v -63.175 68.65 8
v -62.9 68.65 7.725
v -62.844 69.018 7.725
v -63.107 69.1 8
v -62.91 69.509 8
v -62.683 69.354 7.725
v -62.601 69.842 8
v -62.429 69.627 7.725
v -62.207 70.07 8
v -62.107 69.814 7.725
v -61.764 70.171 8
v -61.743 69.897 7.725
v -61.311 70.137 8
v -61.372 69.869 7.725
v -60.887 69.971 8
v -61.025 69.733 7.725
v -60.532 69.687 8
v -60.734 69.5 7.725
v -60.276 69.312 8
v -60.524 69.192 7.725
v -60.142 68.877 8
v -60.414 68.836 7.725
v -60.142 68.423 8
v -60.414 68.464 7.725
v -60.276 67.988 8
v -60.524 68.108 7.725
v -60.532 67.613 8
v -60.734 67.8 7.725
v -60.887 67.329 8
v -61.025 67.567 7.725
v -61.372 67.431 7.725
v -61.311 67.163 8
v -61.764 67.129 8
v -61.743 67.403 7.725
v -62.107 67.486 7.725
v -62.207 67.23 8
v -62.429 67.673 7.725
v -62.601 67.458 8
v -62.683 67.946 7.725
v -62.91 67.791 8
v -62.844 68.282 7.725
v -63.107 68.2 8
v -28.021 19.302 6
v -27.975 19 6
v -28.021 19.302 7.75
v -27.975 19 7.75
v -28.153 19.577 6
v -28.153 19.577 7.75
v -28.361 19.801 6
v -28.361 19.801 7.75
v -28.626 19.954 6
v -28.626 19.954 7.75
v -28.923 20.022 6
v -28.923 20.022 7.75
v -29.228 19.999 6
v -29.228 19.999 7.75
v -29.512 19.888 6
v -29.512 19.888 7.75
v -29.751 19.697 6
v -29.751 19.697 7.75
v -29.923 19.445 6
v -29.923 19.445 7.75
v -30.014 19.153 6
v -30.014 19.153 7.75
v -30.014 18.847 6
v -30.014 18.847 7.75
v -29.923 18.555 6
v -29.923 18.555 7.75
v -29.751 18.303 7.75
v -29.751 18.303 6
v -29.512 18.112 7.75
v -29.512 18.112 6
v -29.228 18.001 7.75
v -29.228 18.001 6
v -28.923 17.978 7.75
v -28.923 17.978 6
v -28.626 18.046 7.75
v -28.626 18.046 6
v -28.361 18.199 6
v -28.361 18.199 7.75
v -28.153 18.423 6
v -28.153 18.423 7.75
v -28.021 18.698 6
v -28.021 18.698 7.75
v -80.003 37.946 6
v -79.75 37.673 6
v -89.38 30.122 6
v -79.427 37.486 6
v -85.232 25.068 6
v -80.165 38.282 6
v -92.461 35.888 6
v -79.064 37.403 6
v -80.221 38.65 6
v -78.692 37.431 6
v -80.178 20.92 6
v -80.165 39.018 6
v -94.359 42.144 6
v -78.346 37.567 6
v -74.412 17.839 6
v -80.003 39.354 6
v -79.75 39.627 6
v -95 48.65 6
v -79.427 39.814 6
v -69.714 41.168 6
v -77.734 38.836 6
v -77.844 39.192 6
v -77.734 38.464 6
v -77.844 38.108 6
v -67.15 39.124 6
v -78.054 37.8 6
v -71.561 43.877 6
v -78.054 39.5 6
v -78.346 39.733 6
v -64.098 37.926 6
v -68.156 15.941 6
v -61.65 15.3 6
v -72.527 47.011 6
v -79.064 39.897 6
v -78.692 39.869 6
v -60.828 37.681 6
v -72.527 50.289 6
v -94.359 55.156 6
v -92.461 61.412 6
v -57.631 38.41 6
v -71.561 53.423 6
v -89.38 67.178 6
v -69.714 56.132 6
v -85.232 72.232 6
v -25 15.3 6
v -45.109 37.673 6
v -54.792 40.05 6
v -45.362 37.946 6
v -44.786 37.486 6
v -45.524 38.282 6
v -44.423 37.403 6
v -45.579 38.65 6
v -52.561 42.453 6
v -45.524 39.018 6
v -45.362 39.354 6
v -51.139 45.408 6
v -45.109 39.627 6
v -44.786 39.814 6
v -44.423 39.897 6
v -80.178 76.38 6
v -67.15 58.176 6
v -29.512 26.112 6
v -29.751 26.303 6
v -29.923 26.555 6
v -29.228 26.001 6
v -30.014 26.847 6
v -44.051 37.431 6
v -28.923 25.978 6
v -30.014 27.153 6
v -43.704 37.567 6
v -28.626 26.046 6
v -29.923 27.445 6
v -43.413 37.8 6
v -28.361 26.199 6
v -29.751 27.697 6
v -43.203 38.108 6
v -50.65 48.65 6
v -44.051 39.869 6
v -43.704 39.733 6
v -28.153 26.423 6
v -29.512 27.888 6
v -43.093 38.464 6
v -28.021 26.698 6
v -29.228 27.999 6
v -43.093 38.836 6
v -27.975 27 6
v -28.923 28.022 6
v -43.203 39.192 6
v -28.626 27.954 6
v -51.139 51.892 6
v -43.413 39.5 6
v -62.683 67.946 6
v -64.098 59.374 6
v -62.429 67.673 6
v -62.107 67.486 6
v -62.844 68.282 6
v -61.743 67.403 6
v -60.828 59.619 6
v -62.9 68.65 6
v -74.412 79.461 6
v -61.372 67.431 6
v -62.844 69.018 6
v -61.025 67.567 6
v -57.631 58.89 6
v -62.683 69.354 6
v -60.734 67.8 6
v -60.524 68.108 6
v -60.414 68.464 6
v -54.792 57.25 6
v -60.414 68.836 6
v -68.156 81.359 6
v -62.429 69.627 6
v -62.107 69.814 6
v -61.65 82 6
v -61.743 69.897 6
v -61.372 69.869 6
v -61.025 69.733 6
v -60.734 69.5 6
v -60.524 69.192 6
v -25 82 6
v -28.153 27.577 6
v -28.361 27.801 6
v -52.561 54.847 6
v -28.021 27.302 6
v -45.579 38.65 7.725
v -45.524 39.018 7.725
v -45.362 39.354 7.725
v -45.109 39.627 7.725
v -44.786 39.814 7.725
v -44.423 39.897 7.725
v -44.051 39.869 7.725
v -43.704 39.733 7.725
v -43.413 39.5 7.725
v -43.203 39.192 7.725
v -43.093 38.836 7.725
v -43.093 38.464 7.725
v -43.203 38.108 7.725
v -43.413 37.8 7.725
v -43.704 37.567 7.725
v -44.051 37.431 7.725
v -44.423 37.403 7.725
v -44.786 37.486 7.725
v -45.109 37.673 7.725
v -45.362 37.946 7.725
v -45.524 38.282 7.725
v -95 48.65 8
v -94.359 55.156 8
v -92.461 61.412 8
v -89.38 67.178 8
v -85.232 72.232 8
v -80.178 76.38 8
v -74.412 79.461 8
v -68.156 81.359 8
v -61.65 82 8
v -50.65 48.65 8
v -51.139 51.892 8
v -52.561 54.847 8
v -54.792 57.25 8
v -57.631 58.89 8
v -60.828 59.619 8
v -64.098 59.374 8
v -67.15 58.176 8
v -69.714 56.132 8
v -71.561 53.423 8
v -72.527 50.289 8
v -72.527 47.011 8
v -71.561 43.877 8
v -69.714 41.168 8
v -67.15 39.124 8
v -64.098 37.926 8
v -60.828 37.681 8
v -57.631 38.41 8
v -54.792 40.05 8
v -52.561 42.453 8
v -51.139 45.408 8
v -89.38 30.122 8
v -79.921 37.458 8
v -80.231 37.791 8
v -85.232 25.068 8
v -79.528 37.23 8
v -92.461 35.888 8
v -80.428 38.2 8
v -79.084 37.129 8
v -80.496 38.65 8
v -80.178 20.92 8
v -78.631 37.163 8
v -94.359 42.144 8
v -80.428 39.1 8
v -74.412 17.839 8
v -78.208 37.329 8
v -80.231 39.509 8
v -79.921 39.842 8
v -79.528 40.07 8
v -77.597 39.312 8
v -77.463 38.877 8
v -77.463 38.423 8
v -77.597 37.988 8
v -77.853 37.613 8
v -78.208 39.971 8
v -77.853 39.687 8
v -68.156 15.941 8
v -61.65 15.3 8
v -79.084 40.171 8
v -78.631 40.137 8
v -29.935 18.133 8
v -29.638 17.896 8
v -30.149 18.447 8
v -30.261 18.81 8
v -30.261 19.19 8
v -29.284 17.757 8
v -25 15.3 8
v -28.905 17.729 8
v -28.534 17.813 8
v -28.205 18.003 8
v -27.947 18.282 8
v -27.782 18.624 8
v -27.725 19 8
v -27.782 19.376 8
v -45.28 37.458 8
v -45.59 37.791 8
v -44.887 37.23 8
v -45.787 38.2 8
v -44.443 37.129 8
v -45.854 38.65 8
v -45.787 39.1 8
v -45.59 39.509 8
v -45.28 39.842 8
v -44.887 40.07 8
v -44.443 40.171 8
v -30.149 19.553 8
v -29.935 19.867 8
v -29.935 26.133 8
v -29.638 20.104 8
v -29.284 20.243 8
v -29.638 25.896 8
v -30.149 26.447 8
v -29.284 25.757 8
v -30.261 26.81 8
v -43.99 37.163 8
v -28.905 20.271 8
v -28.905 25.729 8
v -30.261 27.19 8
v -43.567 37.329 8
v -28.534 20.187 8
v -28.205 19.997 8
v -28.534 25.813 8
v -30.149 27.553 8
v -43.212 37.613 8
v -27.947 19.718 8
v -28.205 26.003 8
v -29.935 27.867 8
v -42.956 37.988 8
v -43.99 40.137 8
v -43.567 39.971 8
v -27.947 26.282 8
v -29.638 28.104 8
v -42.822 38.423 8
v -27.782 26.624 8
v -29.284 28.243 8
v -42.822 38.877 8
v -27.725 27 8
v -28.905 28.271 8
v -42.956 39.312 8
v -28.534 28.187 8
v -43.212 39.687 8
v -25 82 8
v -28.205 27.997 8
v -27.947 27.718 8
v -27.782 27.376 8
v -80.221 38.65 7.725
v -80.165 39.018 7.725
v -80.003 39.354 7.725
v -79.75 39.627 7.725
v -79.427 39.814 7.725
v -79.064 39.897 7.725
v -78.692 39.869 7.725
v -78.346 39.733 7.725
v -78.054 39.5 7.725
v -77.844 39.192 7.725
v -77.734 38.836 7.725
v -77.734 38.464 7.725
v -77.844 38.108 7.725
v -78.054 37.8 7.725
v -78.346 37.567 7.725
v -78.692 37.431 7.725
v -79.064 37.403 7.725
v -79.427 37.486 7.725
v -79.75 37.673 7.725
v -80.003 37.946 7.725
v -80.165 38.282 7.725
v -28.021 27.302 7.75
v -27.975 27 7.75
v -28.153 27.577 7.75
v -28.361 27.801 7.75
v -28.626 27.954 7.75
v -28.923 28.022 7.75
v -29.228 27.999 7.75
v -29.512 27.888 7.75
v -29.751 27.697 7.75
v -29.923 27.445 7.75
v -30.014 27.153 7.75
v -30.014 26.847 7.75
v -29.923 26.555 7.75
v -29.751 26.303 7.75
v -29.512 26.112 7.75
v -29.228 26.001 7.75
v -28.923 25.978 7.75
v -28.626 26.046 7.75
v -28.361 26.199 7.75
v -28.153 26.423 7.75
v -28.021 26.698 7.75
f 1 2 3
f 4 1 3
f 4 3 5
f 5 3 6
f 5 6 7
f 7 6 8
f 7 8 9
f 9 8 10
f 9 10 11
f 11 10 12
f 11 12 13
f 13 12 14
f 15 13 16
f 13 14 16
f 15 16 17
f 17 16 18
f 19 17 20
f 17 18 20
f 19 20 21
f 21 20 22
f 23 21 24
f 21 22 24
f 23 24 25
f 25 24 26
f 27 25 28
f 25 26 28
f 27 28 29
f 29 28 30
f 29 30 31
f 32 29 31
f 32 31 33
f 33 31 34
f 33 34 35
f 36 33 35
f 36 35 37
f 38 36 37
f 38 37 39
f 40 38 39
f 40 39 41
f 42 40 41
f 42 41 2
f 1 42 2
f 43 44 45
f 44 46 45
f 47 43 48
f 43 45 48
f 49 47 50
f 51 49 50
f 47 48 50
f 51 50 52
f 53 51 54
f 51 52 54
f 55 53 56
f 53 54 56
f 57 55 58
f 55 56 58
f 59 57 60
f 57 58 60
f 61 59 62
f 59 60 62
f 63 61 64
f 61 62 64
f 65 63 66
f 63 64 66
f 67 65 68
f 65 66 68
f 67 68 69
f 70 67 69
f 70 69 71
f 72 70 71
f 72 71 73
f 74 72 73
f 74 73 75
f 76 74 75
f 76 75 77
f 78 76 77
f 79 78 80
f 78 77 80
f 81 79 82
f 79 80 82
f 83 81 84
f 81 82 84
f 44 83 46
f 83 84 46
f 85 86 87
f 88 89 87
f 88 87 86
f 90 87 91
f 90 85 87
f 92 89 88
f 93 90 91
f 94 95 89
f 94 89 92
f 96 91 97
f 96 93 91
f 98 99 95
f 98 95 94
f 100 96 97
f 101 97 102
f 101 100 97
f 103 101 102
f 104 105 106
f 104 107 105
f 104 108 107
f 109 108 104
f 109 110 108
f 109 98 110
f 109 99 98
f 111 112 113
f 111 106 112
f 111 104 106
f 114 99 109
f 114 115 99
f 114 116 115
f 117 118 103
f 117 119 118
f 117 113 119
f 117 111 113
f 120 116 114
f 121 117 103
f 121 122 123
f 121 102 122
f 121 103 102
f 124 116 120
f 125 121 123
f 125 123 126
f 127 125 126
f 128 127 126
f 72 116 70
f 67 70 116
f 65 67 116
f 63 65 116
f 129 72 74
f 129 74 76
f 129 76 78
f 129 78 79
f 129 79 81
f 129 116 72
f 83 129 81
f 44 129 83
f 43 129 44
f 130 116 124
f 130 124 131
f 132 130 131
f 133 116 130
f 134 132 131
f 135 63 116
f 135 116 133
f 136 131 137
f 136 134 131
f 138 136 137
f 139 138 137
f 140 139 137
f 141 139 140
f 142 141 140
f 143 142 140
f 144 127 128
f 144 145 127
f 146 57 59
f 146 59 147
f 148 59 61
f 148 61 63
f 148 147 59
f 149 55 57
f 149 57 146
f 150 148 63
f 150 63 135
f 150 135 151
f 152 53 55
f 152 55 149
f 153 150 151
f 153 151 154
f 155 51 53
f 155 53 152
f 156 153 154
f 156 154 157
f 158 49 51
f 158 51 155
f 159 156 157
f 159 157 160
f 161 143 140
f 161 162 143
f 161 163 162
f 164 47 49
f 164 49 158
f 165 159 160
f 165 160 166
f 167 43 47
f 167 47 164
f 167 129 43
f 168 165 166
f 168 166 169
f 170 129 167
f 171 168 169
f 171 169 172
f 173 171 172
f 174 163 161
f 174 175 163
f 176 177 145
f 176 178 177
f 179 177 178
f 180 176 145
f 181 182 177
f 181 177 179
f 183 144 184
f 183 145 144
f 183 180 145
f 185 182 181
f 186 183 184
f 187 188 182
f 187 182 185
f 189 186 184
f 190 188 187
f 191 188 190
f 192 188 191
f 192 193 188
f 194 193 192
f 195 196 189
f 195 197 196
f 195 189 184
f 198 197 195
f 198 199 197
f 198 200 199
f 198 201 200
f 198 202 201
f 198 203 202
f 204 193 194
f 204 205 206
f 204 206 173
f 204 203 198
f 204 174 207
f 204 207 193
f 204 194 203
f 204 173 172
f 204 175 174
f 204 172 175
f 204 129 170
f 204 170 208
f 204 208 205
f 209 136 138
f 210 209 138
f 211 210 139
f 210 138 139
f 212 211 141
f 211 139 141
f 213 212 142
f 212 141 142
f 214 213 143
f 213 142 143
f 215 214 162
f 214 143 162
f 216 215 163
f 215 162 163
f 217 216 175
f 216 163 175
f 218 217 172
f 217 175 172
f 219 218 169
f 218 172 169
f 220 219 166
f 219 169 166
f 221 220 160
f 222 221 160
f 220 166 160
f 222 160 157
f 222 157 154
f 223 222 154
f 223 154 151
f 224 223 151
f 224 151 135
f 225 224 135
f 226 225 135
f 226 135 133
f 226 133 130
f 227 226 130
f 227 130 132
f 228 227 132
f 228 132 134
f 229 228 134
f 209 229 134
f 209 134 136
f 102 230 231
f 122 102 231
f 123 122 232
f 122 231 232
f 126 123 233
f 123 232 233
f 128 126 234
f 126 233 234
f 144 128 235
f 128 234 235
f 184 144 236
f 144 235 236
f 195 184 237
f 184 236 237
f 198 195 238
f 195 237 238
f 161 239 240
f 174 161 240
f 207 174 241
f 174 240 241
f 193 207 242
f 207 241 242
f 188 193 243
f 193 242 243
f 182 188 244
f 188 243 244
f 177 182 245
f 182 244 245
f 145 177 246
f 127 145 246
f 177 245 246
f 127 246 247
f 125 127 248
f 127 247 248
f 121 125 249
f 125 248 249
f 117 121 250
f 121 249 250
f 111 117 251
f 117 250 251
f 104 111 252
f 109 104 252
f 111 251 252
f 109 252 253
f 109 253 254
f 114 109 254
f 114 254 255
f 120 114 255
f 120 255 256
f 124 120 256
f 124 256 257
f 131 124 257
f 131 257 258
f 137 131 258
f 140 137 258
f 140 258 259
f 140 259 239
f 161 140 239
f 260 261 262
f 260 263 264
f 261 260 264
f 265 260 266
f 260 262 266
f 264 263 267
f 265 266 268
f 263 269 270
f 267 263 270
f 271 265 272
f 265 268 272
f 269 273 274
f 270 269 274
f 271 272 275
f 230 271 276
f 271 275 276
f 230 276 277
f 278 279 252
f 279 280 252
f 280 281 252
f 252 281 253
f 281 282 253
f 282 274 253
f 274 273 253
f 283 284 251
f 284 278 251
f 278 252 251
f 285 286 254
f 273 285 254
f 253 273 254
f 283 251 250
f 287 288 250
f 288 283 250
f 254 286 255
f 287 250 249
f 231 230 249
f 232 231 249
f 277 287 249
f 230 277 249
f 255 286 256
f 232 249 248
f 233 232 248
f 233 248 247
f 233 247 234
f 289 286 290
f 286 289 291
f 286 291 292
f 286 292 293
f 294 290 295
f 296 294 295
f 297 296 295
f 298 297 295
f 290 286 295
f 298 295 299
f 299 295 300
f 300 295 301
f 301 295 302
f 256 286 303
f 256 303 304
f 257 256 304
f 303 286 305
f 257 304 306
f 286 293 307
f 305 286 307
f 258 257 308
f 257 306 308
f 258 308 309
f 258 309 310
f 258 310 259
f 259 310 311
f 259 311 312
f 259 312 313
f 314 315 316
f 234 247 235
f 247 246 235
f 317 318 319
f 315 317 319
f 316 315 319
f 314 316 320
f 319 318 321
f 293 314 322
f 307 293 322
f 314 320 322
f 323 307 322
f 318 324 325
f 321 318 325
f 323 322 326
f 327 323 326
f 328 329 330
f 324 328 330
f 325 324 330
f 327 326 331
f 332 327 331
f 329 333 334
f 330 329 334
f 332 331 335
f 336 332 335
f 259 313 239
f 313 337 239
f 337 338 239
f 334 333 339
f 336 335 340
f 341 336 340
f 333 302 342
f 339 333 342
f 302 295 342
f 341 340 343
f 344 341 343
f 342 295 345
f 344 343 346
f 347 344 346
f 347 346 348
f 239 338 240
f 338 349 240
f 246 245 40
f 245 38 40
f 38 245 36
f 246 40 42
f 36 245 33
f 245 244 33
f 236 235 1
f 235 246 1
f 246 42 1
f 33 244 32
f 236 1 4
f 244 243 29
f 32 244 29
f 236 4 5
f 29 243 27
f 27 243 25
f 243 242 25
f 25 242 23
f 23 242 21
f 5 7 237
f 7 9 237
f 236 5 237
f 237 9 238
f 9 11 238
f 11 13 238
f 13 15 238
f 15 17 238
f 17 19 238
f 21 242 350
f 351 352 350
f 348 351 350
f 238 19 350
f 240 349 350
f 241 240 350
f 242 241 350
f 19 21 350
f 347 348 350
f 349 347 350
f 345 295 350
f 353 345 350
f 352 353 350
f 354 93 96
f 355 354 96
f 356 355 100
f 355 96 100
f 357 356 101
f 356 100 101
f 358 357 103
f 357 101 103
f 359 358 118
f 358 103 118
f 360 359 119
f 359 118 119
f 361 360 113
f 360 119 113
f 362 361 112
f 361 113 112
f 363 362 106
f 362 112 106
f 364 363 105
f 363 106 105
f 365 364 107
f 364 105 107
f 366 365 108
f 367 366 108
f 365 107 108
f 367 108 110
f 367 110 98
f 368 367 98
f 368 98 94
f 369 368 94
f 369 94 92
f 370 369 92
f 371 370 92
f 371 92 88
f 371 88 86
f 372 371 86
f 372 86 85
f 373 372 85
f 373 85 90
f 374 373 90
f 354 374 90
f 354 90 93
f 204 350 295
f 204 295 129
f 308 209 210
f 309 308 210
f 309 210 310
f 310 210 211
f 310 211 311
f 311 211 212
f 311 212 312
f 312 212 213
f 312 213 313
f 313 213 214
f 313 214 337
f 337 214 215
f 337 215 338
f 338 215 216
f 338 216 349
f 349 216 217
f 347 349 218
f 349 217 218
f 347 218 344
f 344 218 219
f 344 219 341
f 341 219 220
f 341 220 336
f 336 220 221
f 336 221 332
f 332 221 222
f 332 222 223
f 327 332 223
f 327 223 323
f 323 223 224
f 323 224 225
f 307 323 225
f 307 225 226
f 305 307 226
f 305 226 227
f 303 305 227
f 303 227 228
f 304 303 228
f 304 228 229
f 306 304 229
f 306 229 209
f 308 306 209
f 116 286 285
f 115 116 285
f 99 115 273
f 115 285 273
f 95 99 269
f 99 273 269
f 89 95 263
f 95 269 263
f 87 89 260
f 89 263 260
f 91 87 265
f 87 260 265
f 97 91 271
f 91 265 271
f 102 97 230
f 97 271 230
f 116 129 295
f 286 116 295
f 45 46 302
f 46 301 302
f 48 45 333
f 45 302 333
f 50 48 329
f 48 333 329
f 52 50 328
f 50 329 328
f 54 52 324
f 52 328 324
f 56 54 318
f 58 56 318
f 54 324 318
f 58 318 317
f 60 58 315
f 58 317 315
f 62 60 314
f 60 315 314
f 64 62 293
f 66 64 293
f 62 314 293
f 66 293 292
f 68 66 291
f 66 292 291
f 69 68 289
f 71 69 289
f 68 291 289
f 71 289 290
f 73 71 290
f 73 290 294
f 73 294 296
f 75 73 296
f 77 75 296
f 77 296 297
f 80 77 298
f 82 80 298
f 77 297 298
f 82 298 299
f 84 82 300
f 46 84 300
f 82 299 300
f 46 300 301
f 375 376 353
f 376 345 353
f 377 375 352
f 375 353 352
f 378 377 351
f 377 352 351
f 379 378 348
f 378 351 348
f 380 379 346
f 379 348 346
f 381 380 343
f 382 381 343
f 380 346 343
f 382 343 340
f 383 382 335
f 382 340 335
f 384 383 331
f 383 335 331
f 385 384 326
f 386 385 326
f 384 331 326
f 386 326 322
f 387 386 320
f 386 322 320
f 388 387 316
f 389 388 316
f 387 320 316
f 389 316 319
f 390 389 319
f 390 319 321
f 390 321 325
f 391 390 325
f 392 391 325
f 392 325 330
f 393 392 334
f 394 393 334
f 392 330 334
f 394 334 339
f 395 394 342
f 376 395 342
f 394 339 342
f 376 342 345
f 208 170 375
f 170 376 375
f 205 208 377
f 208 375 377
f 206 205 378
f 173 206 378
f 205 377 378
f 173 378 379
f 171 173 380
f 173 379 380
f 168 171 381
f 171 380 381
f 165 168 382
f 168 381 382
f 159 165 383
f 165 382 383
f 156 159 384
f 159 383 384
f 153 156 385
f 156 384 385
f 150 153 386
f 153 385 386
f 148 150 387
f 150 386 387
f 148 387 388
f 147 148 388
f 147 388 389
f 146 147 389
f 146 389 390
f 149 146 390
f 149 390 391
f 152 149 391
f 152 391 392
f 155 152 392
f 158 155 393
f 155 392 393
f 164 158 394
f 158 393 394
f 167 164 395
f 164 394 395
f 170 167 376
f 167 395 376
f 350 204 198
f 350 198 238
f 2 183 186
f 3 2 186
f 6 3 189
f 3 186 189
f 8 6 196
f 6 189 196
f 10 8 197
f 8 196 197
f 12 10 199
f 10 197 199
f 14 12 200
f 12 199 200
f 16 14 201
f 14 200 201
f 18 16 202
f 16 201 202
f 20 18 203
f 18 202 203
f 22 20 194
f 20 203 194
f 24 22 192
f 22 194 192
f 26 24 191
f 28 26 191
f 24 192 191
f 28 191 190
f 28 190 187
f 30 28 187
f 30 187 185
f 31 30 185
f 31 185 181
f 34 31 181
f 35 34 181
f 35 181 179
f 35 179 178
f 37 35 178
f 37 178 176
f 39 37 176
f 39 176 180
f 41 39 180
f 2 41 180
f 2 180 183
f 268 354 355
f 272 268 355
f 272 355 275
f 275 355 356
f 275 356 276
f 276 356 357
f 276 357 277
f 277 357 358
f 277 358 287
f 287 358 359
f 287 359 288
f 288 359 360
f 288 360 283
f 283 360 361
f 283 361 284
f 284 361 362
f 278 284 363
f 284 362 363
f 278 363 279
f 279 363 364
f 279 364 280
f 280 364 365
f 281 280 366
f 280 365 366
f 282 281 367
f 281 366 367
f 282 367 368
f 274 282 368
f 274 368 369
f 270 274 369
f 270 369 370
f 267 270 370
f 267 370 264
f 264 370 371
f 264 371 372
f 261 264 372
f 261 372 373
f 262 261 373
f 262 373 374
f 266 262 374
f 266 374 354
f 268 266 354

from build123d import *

# Parameters (mm, degrees)
SKETCH_1_W                   = 50
SKETCH_1_H                   = 100
EXTRUDE_1_DEPTH              = 2
SKETCH_2_W                   = 3
SKETCH_2_H                   = 100
EXTRUDE_2_DEPTH              = 80
SKETCH_3_W                   = 2
SKETCH_3_H                   = 66.7
EXTRUDE_3_DEPTH              = 70
CUT_EXTRUDE_4_REACH          = 162.465
SKETCH_8_W                   = 2
SKETCH_8_H                   = 66.7
EXTRUDE_4_DEPTH              = 70
CUT_EXTRUDE_5_REACH          = 140.25
HOLE_WIZARD_M3_1_D           = 2.5
HOLE_WIZARD_M3_1_DEPTH       = 2
HOLE_WIZARD_M3_1_CSINK_D     = 3.05
HOLE_WIZARD_M3_1_CSINK_ANGLE = 90
FILLET_1_R                   = 2
CUT_EXTRUDE_6_REACH          = 140.25
SKETCH_12_R                  = 11
CUT_EXTRUDE_7_REACH          = 162.465
SKETCH_13_R                  = 14.5
SKETCH_14_W                  = 2
SKETCH_14_H                  = 66.7
EXTRUDE_5_DEPTH              = 70
CUT_EXTRUDE_8_REACH          = 156.14
SKETCH_15_R                  = 5.1
CUT_EXTRUDE_9_DEPTH          = 155.140358116
CUT_EXTRUDE_9_DEPTH_BACK     = 155.140358116
SKETCH_19_W                  = 2
SKETCH_19_H                  = 66.7
CUT_EXTRUDE_10_DEPTH         = 119.844436134
FILLET_2_R                   = 2
HOLE_WIZARD_M3_3_D           = 2.5
HOLE_WIZARD_M3_3_CSINK_D     = 3.05
HOLE_WIZARD_M3_3_CSINK_ANGLE = 90
CUT_EXTRUDE_11_DEPTH         = 134.88427839
CUT_EXTRUDE_11_DEPTH_BACK    = 134.88427839


# Read off the part's stored shape, not the designer's step: M1.6 螺纹孔1, M1.6 螺纹孔2, M2.5 螺纹孔1
with BuildPart() as part:
    # 草图1 → 凸台-拉伸1 (new body)
    with BuildSketch(Plane(origin=(0, 0, 0), x_dir=(1, 0, 0), z_dir=(0, 1, 0))):
        Rectangle(SKETCH_1_W, SKETCH_1_H)
    extrude(amount=EXTRUDE_1_DEPTH)

    # 草图2 → 凸台-拉伸2 (add)
    with BuildSketch(Plane(origin=(0, 2, 0), x_dir=(1, 0, 0), z_dir=(0, 1, 0))):
        with Locations((-23.5, 0)):
            Rectangle(SKETCH_2_W, SKETCH_2_H)
    extrude(amount=EXTRUDE_2_DEPTH)

    # 草图3 → 凸台-拉伸3 (add)
    with BuildSketch(Plane.ZY.offset(25)):
        with Locations((-49, 48.65)):
            Rectangle(SKETCH_3_W, SKETCH_3_H)
    extrude(amount=EXTRUDE_3_DEPTH)

    # 草图4 → 切除-拉伸4 (cut, up to next)
    with BuildSketch(Plane(origin=(0, 0, -50), x_dir=(-1, 0, 0), z_dir=(0, 0, -1)), mode=Mode.PRIVATE) as cut_extrude_4_sk1:
        with BuildLine():
            Line((95, 82), (61.65, 82))
            ThreePointArc((61.65, 82), (85.232011153, 72.232011153), (95, 48.65))
            Line((95, 48.65), (95, 82))
        make_face()
    cut_extrude_4_tool1 = extrude(cut_extrude_4_sk1.sketch, amount=-CUT_EXTRUDE_4_REACH, mode=Mode.PRIVATE) & part.part
    # 草图4 → 切除-拉伸4 (cut, up to next)
    with BuildSketch(Plane(origin=(0, 0, -50), x_dir=(-1, 0, 0), z_dir=(0, 0, -1)), mode=Mode.PRIVATE) as cut_extrude_4_sk2:
        with BuildLine():
            ThreePointArc((95, 48.65), (85.232011153, 25.067988847), (61.65, 15.3))
            Line((61.65, 15.3), (95, 15.3))
            Line((95, 15.3), (95, 48.65))
        make_face()
    cut_extrude_4_tool2 = extrude(cut_extrude_4_sk2.sketch, amount=-CUT_EXTRUDE_4_REACH, mode=Mode.PRIVATE) & part.part
    add(cut_extrude_4_tool1.solids().sort_by_distance((-87.550679, 74.550679, -50))[0], mode=Mode.SUBTRACT)
    add(cut_extrude_4_tool2.solids().sort_by_distance((-87.550679, 22.749321, -50))[0], mode=Mode.SUBTRACT)

    # 草图8 → 凸台-拉伸4 (add)
    with BuildSketch(Plane.ZY.offset(25)):
        with Locations((7, 48.65)):
            Rectangle(SKETCH_8_W, SKETCH_8_H)
    extrude(amount=EXTRUDE_4_DEPTH)

    # 草图9 → 切除-拉伸5 (cut, up to next)
    with BuildSketch(Plane.XY.offset(8), mode=Mode.PRIVATE) as cut_extrude_5_sk1:
        with BuildLine():
            ThreePointArc((-95, 48.65), (-85.232011153, 72.232011153), (-61.65, 82))
            Line((-61.65, 82), (-95, 82))
            Line((-95, 82), (-95, 48.65))
        make_face()
    cut_extrude_5_tool1 = extrude(cut_extrude_5_sk1.sketch, amount=-CUT_EXTRUDE_5_REACH, mode=Mode.PRIVATE) & part.part
    # 草图9 → 切除-拉伸5 (cut, up to next)
    with BuildSketch(Plane.XY.offset(8), mode=Mode.PRIVATE) as cut_extrude_5_sk2:
        with BuildLine():
            ThreePointArc((-61.65, 15.3), (-85.232011153, 25.067988847), (-95, 48.65))
            Line((-95, 48.65), (-95, 15.3))
            Line((-95, 15.3), (-61.65, 15.3))
        make_face()
    cut_extrude_5_tool2 = extrude(cut_extrude_5_sk2.sketch, amount=-CUT_EXTRUDE_5_REACH, mode=Mode.PRIVATE) & part.part
    add(cut_extrude_5_tool1.solids().sort_by_distance((-87.550679, 74.550679, 8))[0], mode=Mode.SUBTRACT)
    add(cut_extrude_5_tool2.solids().sort_by_distance((-87.550679, 22.749321, 8))[0], mode=Mode.SUBTRACT)

    # M3 螺纹孔1
    with Locations(Plane.XY.offset(8)):
        with Locations((-78.970508076, 38.65), (-61.65, 68.65), (-44.329491924, 38.65)):
            CounterSinkHole(HOLE_WIZARD_M3_1_D / 2, HOLE_WIZARD_M3_1_CSINK_D / 2, depth=HOLE_WIZARD_M3_1_DEPTH, counter_sink_angle=HOLE_WIZARD_M3_1_CSINK_ANGLE)

    # 圆角1
    fillet_1_edges = [part.edges().sort_by_distance(p)[0] for p in [
        (-23.5, 82, 50),
        (25, 1, 50),
        (25, 1, -50),
    ]]
    fillet(fillet_1_edges, radius=FILLET_1_R)

    # 草图12 → 切除-拉伸6 (cut, up to next)
    with BuildSketch(Plane.XY.offset(8), mode=Mode.PRIVATE) as cut_extrude_6_sk1:
        with Locations((-61.65, 48.65)):
            Circle(SKETCH_12_R)
    cut_extrude_6_tool1 = extrude(cut_extrude_6_sk1.sketch, amount=-CUT_EXTRUDE_6_REACH, mode=Mode.PRIVATE) & part.part
    add(cut_extrude_6_tool1.solids().sort_by_distance((-61.65, 48.65, 8))[0], mode=Mode.SUBTRACT)

    # 草图13 → 切除-拉伸7 (cut, up to next)
    with BuildSketch(Plane(origin=(0, 0, -50), x_dir=(-1, 0, 0), z_dir=(0, 0, -1)), mode=Mode.PRIVATE) as cut_extrude_7_sk1:
        with Locations((61.65, 48.65)):
            Circle(SKETCH_13_R)
    cut_extrude_7_tool1 = extrude(cut_extrude_7_sk1.sketch, amount=-CUT_EXTRUDE_7_REACH, mode=Mode.PRIVATE) & part.part
    add(cut_extrude_7_tool1.solids().sort_by_distance((-61.65, 48.65, -50))[0], mode=Mode.SUBTRACT)

    # 草图14 → 凸台-拉伸5 (add)
    with BuildSketch(Plane.ZY.offset(25)):
        with Locations((-38.5, 48.65)):
            Rectangle(SKETCH_14_W, SKETCH_14_H)
    extrude(amount=EXTRUDE_5_DEPTH)

    # 草图15 → 切除-拉伸8 (cut, up to next)
    with BuildSketch(Plane(origin=(0, 0, -39.5), x_dir=(-1, 0, 0), z_dir=(0, 0, -1)), mode=Mode.PRIVATE) as cut_extrude_8_sk1:
        with Locations(Location((61.65, 48.65, 0), (0, 0, 90))):
            Circle(SKETCH_15_R)
    cut_extrude_8_tool1 = extrude(cut_extrude_8_sk1.sketch, amount=-CUT_EXTRUDE_8_REACH, mode=Mode.PRIVATE) & part.part
    add(cut_extrude_8_tool1.solids().sort_by_distance((-61.65, 48.65, -39.5))[0], mode=Mode.SUBTRACT)

    # 草图18 → 切除-拉伸9 (cut, two sides: drawn at the far end of the back side and taken through both)
    with BuildSketch(Plane(origin=(0, 0, -39.5), x_dir=(-1, 0, 0), z_dir=(0, 0, -1)).offset(-CUT_EXTRUDE_9_DEPTH_BACK)):
        with BuildLine():
            Line((95, 15.3), (95, 48.65))
            ThreePointArc((95, 48.65), (85.232011153, 25.067988847), (61.65, 15.3))
            Line((61.65, 15.3), (95, 15.3))
        make_face()
        with BuildLine():
            Line((95, 48.65), (95, 82))
            Line((95, 82), (61.65, 82))
            ThreePointArc((61.65, 82), (85.232011153, 72.232011153), (95, 48.65))
        make_face()
    extrude(amount=CUT_EXTRUDE_9_DEPTH + CUT_EXTRUDE_9_DEPTH_BACK, mode=Mode.SUBTRACT)

    # 草图19 → 切除-拉伸10 (cut, through all)
    with BuildSketch(Plane.ZY.offset(25)):
        with Locations((-49, 48.65)):
            Rectangle(SKETCH_19_W, SKETCH_19_H)
    extrude(amount=CUT_EXTRUDE_10_DEPTH, mode=Mode.SUBTRACT)

    # 圆角2
    fillet_2_edges = [part.edges().sort_by_distance(p)[0] for p in [
        (-23.5, 82, -50),
    ]]
    fillet(fillet_2_edges, radius=FILLET_2_R)

    # M3 螺纹孔3 (through all)
    with Locations(Plane(origin=(0, 2, 0), x_dir=(1, 0, 0), z_dir=(0, 1, 0))):
        with Locations((-2.7, 0), (21, 10), (21, -10)):
            CounterSinkHole(HOLE_WIZARD_M3_3_D / 2, HOLE_WIZARD_M3_3_CSINK_D / 2, counter_sink_angle=HOLE_WIZARD_M3_3_CSINK_ANGLE)

    # M1.6 螺纹孔1 outline → M1.6 螺纹孔1 (revolve, cut)
    with BuildSketch(Plane(origin=(10, 0, -28), x_dir=(1, 0, 0), z_dir=(0, 0, 1))):
        Polygon((0, 0), (0.625, 0), (0.625, 1.8), (0.825, 2), (0, 2), align=None)
    revolve(axis=Axis((10, 0, -28), (0, 1, 0)), mode=Mode.SUBTRACT)

    # Hole Wizard M1.6 _1 2 outline → Hole Wizard M1.6 _1 2 (revolve, cut)
    with BuildSketch(Plane(origin=(6.4, 0, -28), x_dir=(1, 0, 0), z_dir=(0, 0, 1))):
        Polygon((0, 0), (0.625, 0), (0.625, 1.8), (0.825, 2), (0, 2), align=None)
    revolve(axis=Axis((6.4, 0, -28), (0, 1, 0)), mode=Mode.SUBTRACT)

    # M1.6 螺纹孔2 outline → M1.6 螺纹孔2 (revolve, cut)
    with BuildSketch(Plane(origin=(10, 0, -22), x_dir=(1, 0, 0), z_dir=(0, 0, 1))):
        Polygon((0, 0), (0.625, 0), (0.625, 1.8), (0.825, 2), (0, 2), align=None)
    revolve(axis=Axis((10, 0, -22), (0, 1, 0)), mode=Mode.SUBTRACT)

    # Hole Wizard M1.6 _2 2 outline → Hole Wizard M1.6 _2 2 (revolve, cut)
    with BuildSketch(Plane(origin=(6.4, 0, -22), x_dir=(1, 0, 0), z_dir=(0, 0, 1))):
        Polygon((0, 0), (0.625, 0), (0.625, 1.8), (0.825, 2), (0, 2), align=None)
    revolve(axis=Axis((6.4, 0, -22), (0, 1, 0)), mode=Mode.SUBTRACT)

    # 草图28 → 切除-拉伸11 (cut, two sides: drawn at the far end of the back side and taken through both)
    with BuildSketch(Plane(origin=(0, 2, 0), x_dir=(1, 0, 0), z_dir=(0, 1, 0)).offset(-CUT_EXTRUDE_11_DEPTH_BACK)):
        Polygon((-25, 37.5), (-95, 37.5), (-95, 39.5), (-25, 39.5), (-25, 50), (25, 50), (25, -50), (-25, -50), align=None)
    extrude(amount=CUT_EXTRUDE_11_DEPTH + CUT_EXTRUDE_11_DEPTH_BACK, mode=Mode.SUBTRACT)

    # M2.5 螺纹孔1 outline → M2.5 螺纹孔1 (revolve, cut)
    with BuildSketch(Plane(origin=(-29, 19, 0), x_dir=(1, 0, 0), z_dir=(0, -1, 0))):
        Polygon((0, 6), (1.025, 6), (1.025, 7.75), (1.275, 8), (0, 8), align=None)
    revolve(axis=Axis((-29, 19, 0), (0, 0, 1)), mode=Mode.SUBTRACT)

    # Hole Wizard M2.5 _1 2 outline → Hole Wizard M2.5 _1 2 (revolve, cut)
    with BuildSketch(Plane(origin=(-29, 27, 0), x_dir=(1, 0, 0), z_dir=(0, -1, 0))):
        Polygon((0, 6), (1.025, 6), (1.025, 7.75), (1.275, 8), (0, 8), align=None)
    revolve(axis=Axis((-29, 27, 0), (0, 0, 1)), mode=Mode.SUBTRACT)


solid = part.part
